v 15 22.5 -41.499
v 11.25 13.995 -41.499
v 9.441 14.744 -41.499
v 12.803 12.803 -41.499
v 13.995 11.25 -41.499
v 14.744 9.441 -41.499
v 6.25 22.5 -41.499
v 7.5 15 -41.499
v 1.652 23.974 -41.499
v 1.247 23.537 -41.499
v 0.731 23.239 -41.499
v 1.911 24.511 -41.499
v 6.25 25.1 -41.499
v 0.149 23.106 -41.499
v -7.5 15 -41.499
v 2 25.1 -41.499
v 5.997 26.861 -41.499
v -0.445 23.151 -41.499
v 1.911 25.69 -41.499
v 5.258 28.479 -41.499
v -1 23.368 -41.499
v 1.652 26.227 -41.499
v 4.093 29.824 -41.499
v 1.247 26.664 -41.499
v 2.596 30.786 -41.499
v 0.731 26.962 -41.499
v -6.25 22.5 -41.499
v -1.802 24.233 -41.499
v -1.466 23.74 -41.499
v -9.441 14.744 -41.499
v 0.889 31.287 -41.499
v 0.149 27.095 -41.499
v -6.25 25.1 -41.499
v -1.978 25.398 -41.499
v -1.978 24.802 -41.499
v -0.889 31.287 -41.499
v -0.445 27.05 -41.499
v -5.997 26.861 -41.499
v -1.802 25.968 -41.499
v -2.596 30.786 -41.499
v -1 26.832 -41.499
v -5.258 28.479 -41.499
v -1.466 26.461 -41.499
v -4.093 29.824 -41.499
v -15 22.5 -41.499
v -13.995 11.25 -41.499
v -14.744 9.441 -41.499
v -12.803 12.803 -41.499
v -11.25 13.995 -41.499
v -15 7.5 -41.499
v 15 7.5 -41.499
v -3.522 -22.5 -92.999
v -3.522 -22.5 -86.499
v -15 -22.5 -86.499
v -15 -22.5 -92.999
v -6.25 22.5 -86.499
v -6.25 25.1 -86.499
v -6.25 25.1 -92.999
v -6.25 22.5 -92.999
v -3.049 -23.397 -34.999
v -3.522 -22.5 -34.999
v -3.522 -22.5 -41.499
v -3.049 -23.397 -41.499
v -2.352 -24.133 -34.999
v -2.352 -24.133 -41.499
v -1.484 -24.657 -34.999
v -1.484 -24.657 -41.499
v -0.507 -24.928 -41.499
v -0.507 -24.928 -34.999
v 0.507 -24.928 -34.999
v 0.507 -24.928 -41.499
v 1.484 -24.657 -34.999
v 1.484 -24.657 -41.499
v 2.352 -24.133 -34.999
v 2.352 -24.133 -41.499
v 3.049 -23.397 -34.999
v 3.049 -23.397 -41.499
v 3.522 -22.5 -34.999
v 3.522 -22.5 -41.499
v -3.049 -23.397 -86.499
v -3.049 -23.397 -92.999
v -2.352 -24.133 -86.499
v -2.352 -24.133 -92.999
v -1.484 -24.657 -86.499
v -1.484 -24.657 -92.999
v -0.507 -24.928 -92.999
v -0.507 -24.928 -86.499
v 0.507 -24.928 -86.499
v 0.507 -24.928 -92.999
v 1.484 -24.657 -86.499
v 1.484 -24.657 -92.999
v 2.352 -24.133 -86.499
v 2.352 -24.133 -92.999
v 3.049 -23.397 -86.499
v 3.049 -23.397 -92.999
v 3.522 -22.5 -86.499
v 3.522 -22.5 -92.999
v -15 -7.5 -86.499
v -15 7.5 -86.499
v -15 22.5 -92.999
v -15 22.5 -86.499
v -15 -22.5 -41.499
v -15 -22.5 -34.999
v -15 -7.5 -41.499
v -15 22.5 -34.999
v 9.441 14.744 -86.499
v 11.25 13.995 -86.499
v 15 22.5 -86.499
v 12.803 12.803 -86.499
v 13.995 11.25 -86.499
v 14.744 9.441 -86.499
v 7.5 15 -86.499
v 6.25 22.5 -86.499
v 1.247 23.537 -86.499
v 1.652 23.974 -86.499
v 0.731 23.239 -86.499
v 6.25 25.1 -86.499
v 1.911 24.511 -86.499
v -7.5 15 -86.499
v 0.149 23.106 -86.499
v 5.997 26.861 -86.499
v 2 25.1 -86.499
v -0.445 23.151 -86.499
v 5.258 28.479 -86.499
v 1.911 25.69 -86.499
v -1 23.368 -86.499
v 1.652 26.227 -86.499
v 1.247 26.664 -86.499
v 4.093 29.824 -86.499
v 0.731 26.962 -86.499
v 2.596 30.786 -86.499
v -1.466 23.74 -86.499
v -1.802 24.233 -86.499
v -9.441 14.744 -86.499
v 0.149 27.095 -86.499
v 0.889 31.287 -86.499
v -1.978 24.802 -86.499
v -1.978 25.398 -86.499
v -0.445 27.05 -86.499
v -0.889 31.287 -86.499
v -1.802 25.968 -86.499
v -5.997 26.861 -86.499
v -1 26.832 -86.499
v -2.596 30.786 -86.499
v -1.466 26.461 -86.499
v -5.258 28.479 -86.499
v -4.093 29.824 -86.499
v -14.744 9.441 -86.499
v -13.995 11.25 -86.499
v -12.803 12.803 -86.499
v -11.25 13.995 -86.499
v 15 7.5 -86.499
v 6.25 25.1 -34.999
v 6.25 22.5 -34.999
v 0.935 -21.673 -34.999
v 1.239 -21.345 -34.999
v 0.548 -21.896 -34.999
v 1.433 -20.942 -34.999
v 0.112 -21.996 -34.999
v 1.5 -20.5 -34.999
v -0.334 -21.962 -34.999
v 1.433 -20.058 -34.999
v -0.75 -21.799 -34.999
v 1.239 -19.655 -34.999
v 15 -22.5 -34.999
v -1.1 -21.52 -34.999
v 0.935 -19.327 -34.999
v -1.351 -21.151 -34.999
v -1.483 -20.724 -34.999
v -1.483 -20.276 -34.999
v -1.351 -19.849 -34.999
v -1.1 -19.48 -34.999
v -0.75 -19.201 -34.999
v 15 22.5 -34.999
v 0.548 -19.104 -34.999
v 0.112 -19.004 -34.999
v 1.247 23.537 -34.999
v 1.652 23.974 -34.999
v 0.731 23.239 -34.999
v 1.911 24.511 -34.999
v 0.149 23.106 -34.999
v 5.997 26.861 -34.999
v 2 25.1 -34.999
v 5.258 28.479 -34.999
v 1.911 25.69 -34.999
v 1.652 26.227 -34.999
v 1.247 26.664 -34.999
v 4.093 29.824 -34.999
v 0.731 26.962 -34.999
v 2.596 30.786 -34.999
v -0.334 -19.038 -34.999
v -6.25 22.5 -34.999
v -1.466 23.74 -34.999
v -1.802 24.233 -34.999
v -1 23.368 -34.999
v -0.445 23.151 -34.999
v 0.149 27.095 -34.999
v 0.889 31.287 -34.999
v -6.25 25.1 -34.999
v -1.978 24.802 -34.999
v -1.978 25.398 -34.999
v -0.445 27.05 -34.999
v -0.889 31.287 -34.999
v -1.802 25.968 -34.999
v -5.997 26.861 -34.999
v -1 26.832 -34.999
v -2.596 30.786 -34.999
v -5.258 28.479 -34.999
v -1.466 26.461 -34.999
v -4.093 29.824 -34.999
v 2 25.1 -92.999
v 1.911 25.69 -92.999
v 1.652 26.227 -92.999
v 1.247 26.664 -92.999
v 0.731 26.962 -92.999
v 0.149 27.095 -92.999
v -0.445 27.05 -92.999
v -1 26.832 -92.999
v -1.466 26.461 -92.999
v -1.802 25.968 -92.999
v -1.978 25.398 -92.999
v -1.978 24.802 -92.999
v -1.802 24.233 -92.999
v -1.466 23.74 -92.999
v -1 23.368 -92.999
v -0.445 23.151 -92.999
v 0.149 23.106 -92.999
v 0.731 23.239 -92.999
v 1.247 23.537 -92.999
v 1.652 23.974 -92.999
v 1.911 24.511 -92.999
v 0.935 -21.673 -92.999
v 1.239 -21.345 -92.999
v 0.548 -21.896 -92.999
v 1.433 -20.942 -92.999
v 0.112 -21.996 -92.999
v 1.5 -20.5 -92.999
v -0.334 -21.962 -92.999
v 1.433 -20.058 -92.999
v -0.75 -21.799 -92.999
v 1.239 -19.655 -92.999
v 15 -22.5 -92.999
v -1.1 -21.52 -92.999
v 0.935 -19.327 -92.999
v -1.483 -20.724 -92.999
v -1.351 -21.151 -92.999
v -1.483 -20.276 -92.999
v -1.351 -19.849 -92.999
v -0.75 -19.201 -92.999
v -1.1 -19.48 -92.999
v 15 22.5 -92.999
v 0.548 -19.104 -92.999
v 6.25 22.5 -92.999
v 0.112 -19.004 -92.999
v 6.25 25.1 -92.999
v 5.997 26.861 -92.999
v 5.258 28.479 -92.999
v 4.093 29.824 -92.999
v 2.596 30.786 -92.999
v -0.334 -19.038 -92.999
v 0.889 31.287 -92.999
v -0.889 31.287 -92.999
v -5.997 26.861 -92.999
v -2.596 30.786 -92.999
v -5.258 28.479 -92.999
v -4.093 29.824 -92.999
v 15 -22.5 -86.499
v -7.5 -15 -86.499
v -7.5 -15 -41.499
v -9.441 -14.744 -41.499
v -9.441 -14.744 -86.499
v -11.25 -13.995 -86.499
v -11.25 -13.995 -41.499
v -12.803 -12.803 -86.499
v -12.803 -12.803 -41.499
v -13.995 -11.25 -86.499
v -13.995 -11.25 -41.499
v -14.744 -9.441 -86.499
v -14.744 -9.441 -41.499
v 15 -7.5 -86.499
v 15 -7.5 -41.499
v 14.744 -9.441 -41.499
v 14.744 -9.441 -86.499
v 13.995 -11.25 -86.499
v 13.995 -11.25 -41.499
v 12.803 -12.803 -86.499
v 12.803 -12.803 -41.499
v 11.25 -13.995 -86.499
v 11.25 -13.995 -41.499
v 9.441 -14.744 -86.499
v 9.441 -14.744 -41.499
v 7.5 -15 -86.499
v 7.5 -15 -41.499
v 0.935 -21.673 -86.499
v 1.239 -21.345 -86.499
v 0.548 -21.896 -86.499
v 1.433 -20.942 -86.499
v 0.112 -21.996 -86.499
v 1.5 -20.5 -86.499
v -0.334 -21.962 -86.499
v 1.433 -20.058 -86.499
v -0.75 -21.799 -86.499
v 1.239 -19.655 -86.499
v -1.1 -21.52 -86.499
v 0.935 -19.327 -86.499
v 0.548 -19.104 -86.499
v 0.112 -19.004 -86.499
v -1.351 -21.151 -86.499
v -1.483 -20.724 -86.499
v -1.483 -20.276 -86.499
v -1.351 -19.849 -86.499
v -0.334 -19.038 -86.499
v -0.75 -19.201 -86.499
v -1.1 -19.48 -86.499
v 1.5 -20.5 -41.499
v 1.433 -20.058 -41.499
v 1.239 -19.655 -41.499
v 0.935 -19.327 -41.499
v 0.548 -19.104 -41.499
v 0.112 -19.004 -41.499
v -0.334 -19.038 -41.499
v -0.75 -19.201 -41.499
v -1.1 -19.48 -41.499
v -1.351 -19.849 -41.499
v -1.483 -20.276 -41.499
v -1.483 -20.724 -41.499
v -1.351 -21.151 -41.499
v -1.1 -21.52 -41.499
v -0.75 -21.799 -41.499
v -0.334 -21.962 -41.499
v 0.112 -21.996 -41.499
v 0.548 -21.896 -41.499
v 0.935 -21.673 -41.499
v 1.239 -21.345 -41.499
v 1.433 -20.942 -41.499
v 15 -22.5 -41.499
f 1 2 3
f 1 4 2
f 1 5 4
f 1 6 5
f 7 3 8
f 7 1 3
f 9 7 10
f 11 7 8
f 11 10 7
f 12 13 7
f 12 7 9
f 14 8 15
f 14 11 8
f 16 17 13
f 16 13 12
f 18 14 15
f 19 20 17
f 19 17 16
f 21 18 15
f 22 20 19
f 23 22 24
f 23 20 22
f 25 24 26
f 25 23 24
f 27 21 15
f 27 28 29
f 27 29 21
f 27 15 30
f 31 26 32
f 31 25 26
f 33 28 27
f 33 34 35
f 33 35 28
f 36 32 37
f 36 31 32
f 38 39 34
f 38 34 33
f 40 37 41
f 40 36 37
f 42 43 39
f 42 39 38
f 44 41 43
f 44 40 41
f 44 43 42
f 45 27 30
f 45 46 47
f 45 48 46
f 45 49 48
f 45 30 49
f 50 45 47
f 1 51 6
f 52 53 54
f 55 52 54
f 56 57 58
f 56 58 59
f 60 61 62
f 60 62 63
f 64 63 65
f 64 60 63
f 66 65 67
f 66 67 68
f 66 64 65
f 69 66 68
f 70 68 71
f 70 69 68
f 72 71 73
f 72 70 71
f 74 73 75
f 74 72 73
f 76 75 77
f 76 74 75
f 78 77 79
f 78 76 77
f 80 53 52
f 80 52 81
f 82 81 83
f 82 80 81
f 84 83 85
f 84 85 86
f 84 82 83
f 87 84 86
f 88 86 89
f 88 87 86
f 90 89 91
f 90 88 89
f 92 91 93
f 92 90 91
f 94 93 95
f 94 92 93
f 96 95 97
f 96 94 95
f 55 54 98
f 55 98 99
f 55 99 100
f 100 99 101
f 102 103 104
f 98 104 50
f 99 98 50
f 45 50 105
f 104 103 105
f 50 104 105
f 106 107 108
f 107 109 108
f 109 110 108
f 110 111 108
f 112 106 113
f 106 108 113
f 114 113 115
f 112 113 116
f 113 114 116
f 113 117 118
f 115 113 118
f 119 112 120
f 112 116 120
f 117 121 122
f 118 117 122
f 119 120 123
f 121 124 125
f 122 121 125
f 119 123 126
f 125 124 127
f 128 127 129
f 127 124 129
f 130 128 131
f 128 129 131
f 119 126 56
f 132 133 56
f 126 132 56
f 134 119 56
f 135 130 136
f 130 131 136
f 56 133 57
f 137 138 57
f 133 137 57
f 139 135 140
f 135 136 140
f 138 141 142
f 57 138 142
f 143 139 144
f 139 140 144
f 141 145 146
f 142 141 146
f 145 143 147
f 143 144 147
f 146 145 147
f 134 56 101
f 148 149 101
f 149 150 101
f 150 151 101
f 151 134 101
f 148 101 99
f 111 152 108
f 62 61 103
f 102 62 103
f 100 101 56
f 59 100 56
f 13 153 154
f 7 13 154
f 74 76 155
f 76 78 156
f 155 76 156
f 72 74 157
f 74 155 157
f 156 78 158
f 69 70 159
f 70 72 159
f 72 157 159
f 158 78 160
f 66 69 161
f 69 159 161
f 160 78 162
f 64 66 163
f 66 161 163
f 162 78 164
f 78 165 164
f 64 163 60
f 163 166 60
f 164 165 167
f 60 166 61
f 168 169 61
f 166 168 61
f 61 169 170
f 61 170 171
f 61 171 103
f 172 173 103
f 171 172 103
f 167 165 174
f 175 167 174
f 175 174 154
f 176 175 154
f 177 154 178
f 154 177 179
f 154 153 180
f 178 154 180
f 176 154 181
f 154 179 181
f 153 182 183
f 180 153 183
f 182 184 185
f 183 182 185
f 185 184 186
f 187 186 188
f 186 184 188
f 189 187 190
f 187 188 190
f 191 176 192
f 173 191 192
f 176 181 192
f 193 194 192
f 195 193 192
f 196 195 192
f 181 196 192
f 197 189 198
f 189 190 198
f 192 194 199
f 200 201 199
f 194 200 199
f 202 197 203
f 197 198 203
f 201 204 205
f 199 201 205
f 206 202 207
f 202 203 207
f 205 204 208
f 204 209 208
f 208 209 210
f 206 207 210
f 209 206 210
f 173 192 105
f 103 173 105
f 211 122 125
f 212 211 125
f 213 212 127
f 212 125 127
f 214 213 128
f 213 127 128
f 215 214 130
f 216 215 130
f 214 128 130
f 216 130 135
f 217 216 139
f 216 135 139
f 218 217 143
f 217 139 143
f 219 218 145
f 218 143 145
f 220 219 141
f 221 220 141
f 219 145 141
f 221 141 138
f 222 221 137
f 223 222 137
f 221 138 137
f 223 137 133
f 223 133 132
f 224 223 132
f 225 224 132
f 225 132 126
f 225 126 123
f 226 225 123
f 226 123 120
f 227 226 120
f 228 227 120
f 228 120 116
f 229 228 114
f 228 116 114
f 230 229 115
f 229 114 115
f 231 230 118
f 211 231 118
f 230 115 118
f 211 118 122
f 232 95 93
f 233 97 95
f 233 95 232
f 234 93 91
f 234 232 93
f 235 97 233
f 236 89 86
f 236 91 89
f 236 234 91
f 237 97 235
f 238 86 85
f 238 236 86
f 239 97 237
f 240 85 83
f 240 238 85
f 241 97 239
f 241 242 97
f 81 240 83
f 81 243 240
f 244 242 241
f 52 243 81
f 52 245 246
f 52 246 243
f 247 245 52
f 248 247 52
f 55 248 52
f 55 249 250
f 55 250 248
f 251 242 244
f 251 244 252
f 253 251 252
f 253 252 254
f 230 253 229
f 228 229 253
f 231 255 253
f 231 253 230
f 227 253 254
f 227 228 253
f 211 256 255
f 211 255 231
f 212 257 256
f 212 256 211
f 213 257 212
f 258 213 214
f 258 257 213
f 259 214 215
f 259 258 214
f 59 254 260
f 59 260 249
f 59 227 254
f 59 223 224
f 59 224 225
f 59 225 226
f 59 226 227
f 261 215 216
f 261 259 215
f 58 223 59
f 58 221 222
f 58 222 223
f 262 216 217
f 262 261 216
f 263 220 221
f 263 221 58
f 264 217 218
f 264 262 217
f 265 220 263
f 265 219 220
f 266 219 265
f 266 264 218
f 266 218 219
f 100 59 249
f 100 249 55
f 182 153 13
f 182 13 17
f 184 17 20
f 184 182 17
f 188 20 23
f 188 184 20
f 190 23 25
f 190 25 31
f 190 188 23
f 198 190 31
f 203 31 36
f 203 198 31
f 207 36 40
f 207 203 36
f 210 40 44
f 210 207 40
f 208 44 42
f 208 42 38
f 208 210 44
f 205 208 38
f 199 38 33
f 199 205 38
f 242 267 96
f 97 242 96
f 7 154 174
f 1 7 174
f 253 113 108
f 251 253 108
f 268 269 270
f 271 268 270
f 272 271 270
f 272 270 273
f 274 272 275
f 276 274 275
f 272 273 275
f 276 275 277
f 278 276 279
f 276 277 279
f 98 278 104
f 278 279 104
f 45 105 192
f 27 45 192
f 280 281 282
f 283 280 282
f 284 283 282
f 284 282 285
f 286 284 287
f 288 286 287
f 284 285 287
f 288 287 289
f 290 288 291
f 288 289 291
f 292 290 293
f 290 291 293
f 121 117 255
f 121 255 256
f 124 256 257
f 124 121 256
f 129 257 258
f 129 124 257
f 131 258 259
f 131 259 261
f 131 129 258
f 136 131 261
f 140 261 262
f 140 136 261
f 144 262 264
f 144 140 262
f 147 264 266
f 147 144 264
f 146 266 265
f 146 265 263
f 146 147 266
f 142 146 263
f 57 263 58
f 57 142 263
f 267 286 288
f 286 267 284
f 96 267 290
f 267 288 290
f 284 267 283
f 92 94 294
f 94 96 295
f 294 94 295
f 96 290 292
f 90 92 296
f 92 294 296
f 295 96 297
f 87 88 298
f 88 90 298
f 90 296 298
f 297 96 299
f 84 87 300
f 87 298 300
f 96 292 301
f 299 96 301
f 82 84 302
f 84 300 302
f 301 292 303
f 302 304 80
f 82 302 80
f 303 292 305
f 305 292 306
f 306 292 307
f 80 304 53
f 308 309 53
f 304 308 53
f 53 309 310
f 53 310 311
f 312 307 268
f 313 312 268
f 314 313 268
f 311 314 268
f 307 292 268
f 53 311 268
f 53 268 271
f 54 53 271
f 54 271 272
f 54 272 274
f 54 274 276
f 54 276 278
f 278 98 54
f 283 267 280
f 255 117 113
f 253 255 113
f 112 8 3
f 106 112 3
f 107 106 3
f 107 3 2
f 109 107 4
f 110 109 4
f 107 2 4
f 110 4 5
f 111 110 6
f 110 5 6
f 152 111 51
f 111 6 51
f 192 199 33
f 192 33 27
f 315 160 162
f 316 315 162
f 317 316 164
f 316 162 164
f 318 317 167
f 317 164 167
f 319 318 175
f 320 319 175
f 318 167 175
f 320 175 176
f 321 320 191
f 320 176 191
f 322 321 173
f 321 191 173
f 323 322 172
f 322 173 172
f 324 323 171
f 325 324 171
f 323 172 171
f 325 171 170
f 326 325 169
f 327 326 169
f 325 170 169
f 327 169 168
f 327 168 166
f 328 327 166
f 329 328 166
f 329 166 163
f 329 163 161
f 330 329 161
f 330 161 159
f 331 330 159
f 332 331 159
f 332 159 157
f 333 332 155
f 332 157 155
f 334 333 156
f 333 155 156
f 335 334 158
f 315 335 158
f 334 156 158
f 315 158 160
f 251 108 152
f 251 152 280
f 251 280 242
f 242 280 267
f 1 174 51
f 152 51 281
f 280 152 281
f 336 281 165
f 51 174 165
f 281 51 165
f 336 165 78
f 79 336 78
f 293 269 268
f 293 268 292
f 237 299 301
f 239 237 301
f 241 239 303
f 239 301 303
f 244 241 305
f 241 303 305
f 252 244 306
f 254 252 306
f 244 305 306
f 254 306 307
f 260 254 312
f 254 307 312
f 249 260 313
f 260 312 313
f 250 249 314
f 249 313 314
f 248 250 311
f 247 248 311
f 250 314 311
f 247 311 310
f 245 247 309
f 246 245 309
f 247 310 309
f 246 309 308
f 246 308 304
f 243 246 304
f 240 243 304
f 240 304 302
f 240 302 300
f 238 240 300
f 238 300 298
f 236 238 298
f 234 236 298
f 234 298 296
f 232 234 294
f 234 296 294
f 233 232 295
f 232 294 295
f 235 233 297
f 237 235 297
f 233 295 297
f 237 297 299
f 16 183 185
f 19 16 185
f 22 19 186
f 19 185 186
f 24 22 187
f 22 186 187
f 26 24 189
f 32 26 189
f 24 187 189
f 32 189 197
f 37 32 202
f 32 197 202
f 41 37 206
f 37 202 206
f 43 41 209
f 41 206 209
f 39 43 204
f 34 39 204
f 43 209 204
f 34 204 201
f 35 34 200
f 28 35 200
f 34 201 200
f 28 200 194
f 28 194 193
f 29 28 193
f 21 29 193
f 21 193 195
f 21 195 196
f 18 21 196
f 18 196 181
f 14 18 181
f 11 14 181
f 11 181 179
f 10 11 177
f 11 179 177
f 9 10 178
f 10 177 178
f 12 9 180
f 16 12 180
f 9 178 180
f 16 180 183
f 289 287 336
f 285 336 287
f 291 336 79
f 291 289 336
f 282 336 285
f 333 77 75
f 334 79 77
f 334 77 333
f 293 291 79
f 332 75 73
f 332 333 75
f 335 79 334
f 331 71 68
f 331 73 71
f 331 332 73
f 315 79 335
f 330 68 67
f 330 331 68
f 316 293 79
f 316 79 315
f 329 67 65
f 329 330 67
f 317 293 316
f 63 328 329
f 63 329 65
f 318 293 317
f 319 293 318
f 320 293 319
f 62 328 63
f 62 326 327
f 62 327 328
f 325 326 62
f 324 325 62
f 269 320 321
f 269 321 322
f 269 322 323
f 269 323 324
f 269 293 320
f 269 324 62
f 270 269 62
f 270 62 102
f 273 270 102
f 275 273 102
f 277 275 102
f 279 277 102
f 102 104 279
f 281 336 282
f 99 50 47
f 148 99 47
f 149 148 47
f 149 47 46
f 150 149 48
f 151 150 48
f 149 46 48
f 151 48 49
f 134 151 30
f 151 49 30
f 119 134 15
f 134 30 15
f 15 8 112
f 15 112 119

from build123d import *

# Parameters (mm, degrees)
SKETCH050_R      = 2
SKETCH050_R_2    = 1.5
EXTRUDE038_DEPTH = 6.5
EXTRUDE039_DEPTH = 45
SKETCH052_R      = 2
SKETCH052_R_2    = 1.5
EXTRUDE040_DEPTH = 6.5


with BuildPart() as extrude038:
    # Sketch050 → Extrude038 (new body)
    with BuildSketch(Plane.XY):
        with BuildLine():
            Line((-15, 22.5), (-6.25, 22.5))
            Line((-6.25, 25.100357), (-6.25, 22.5))
            ThreePointArc((6.25, 25.100357), (0, 31.350357), (-6.25, 25.100357))
            Line((6.25, 25.100357), (6.25, 22.5))
            Line((6.25, 22.5), (15, 22.5))
            Line((15, 22.5), (15, -22.5))
            Line((15, -22.5), (3.522198, -22.5))
            ThreePointArc((-3.522198, -22.5), (0, -24.962903), (3.522198, -22.5))
            Line((-3.522198, -22.5), (-15, -22.5))
            Line((-15, -22.5), (-15, 22.5))
        make_face()
        with Locations((0, 25.100357)):
            Circle(SKETCH050_R, mode=Mode.SUBTRACT)
        with Locations((0, -20.5)):
            Circle(SKETCH050_R_2, mode=Mode.SUBTRACT)
    extrude(amount=-EXTRUDE038_DEPTH)


with BuildPart() as extrude038_1:
    # Extrude038 placement: moved
    add(extrude038.part.moved(Location((0, 0, -34.999))))


with BuildPart() as extrude039:
    # Sketch051 (on Face13 of Extrude038) → Extrude039 (new body)
    with BuildSketch(Plane(origin=(0, 0, -41.499), x_dir=(1, 0, 0), z_dir=(0, 0, -1))):
        with BuildLine():
            ThreePointArc((-7.5, 15), (-12.803301, 12.803301), (-15, 7.5))
            Line((-15, -7.5), (-15, 7.5))
            ThreePointArc((-15, -7.5), (-12.803301, -12.803301), (-7.5, -15))
            Line((7.5, -15), (-7.5, -15))
            ThreePointArc((7.5, -15), (12.803301, -12.803301), (15, -7.5))
            Line((15, 7.5), (15, -7.5))
            ThreePointArc((15, 7.5), (12.803301, 12.803301), (7.5, 15))
            Line((-7.5, 15), (7.5, 15))
        make_face()
    extrude(amount=EXTRUDE039_DEPTH)


with BuildPart() as actuator_base:
    # Sketch052 → Extrude040 (new body)
    with BuildSketch(Plane.XY):
        with BuildLine():
            Line((-15, 22.5), (-6.25, 22.5))
            Line((-6.25, 25.100357), (-6.25, 22.5))
            ThreePointArc((6.25, 25.100357), (0, 31.350357), (-6.25, 25.100357))
            Line((6.25, 25.100357), (6.25, 22.5))
            Line((6.25, 22.5), (15, 22.5))
            Line((15, 22.5), (15, -22.5))
            Line((15, -22.5), (3.522198, -22.5))
            ThreePointArc((-3.522198, -22.5), (0, -24.962903), (3.522198, -22.5))
            Line((-3.522198, -22.5), (-15, -22.5))
            Line((-15, -22.5), (-15, 22.5))
        make_face()
        with Locations((0, 25.100357)):
            Circle(SKETCH052_R, mode=Mode.SUBTRACT)
        with Locations((0, -20.5)):
            Circle(SKETCH052_R_2, mode=Mode.SUBTRACT)
    extrude(amount=-EXTRUDE040_DEPTH)


with BuildPart() as actuator_base_1:
    # Extrude040 placement: moved
    add(actuator_base.part.moved(Location((0, 0, -86.499))))

    # Fusion017: union Extrude038, Extrude039
    add(extrude038_1.part)
    add(extrude039.part)


solid = actuator_base_1.part
